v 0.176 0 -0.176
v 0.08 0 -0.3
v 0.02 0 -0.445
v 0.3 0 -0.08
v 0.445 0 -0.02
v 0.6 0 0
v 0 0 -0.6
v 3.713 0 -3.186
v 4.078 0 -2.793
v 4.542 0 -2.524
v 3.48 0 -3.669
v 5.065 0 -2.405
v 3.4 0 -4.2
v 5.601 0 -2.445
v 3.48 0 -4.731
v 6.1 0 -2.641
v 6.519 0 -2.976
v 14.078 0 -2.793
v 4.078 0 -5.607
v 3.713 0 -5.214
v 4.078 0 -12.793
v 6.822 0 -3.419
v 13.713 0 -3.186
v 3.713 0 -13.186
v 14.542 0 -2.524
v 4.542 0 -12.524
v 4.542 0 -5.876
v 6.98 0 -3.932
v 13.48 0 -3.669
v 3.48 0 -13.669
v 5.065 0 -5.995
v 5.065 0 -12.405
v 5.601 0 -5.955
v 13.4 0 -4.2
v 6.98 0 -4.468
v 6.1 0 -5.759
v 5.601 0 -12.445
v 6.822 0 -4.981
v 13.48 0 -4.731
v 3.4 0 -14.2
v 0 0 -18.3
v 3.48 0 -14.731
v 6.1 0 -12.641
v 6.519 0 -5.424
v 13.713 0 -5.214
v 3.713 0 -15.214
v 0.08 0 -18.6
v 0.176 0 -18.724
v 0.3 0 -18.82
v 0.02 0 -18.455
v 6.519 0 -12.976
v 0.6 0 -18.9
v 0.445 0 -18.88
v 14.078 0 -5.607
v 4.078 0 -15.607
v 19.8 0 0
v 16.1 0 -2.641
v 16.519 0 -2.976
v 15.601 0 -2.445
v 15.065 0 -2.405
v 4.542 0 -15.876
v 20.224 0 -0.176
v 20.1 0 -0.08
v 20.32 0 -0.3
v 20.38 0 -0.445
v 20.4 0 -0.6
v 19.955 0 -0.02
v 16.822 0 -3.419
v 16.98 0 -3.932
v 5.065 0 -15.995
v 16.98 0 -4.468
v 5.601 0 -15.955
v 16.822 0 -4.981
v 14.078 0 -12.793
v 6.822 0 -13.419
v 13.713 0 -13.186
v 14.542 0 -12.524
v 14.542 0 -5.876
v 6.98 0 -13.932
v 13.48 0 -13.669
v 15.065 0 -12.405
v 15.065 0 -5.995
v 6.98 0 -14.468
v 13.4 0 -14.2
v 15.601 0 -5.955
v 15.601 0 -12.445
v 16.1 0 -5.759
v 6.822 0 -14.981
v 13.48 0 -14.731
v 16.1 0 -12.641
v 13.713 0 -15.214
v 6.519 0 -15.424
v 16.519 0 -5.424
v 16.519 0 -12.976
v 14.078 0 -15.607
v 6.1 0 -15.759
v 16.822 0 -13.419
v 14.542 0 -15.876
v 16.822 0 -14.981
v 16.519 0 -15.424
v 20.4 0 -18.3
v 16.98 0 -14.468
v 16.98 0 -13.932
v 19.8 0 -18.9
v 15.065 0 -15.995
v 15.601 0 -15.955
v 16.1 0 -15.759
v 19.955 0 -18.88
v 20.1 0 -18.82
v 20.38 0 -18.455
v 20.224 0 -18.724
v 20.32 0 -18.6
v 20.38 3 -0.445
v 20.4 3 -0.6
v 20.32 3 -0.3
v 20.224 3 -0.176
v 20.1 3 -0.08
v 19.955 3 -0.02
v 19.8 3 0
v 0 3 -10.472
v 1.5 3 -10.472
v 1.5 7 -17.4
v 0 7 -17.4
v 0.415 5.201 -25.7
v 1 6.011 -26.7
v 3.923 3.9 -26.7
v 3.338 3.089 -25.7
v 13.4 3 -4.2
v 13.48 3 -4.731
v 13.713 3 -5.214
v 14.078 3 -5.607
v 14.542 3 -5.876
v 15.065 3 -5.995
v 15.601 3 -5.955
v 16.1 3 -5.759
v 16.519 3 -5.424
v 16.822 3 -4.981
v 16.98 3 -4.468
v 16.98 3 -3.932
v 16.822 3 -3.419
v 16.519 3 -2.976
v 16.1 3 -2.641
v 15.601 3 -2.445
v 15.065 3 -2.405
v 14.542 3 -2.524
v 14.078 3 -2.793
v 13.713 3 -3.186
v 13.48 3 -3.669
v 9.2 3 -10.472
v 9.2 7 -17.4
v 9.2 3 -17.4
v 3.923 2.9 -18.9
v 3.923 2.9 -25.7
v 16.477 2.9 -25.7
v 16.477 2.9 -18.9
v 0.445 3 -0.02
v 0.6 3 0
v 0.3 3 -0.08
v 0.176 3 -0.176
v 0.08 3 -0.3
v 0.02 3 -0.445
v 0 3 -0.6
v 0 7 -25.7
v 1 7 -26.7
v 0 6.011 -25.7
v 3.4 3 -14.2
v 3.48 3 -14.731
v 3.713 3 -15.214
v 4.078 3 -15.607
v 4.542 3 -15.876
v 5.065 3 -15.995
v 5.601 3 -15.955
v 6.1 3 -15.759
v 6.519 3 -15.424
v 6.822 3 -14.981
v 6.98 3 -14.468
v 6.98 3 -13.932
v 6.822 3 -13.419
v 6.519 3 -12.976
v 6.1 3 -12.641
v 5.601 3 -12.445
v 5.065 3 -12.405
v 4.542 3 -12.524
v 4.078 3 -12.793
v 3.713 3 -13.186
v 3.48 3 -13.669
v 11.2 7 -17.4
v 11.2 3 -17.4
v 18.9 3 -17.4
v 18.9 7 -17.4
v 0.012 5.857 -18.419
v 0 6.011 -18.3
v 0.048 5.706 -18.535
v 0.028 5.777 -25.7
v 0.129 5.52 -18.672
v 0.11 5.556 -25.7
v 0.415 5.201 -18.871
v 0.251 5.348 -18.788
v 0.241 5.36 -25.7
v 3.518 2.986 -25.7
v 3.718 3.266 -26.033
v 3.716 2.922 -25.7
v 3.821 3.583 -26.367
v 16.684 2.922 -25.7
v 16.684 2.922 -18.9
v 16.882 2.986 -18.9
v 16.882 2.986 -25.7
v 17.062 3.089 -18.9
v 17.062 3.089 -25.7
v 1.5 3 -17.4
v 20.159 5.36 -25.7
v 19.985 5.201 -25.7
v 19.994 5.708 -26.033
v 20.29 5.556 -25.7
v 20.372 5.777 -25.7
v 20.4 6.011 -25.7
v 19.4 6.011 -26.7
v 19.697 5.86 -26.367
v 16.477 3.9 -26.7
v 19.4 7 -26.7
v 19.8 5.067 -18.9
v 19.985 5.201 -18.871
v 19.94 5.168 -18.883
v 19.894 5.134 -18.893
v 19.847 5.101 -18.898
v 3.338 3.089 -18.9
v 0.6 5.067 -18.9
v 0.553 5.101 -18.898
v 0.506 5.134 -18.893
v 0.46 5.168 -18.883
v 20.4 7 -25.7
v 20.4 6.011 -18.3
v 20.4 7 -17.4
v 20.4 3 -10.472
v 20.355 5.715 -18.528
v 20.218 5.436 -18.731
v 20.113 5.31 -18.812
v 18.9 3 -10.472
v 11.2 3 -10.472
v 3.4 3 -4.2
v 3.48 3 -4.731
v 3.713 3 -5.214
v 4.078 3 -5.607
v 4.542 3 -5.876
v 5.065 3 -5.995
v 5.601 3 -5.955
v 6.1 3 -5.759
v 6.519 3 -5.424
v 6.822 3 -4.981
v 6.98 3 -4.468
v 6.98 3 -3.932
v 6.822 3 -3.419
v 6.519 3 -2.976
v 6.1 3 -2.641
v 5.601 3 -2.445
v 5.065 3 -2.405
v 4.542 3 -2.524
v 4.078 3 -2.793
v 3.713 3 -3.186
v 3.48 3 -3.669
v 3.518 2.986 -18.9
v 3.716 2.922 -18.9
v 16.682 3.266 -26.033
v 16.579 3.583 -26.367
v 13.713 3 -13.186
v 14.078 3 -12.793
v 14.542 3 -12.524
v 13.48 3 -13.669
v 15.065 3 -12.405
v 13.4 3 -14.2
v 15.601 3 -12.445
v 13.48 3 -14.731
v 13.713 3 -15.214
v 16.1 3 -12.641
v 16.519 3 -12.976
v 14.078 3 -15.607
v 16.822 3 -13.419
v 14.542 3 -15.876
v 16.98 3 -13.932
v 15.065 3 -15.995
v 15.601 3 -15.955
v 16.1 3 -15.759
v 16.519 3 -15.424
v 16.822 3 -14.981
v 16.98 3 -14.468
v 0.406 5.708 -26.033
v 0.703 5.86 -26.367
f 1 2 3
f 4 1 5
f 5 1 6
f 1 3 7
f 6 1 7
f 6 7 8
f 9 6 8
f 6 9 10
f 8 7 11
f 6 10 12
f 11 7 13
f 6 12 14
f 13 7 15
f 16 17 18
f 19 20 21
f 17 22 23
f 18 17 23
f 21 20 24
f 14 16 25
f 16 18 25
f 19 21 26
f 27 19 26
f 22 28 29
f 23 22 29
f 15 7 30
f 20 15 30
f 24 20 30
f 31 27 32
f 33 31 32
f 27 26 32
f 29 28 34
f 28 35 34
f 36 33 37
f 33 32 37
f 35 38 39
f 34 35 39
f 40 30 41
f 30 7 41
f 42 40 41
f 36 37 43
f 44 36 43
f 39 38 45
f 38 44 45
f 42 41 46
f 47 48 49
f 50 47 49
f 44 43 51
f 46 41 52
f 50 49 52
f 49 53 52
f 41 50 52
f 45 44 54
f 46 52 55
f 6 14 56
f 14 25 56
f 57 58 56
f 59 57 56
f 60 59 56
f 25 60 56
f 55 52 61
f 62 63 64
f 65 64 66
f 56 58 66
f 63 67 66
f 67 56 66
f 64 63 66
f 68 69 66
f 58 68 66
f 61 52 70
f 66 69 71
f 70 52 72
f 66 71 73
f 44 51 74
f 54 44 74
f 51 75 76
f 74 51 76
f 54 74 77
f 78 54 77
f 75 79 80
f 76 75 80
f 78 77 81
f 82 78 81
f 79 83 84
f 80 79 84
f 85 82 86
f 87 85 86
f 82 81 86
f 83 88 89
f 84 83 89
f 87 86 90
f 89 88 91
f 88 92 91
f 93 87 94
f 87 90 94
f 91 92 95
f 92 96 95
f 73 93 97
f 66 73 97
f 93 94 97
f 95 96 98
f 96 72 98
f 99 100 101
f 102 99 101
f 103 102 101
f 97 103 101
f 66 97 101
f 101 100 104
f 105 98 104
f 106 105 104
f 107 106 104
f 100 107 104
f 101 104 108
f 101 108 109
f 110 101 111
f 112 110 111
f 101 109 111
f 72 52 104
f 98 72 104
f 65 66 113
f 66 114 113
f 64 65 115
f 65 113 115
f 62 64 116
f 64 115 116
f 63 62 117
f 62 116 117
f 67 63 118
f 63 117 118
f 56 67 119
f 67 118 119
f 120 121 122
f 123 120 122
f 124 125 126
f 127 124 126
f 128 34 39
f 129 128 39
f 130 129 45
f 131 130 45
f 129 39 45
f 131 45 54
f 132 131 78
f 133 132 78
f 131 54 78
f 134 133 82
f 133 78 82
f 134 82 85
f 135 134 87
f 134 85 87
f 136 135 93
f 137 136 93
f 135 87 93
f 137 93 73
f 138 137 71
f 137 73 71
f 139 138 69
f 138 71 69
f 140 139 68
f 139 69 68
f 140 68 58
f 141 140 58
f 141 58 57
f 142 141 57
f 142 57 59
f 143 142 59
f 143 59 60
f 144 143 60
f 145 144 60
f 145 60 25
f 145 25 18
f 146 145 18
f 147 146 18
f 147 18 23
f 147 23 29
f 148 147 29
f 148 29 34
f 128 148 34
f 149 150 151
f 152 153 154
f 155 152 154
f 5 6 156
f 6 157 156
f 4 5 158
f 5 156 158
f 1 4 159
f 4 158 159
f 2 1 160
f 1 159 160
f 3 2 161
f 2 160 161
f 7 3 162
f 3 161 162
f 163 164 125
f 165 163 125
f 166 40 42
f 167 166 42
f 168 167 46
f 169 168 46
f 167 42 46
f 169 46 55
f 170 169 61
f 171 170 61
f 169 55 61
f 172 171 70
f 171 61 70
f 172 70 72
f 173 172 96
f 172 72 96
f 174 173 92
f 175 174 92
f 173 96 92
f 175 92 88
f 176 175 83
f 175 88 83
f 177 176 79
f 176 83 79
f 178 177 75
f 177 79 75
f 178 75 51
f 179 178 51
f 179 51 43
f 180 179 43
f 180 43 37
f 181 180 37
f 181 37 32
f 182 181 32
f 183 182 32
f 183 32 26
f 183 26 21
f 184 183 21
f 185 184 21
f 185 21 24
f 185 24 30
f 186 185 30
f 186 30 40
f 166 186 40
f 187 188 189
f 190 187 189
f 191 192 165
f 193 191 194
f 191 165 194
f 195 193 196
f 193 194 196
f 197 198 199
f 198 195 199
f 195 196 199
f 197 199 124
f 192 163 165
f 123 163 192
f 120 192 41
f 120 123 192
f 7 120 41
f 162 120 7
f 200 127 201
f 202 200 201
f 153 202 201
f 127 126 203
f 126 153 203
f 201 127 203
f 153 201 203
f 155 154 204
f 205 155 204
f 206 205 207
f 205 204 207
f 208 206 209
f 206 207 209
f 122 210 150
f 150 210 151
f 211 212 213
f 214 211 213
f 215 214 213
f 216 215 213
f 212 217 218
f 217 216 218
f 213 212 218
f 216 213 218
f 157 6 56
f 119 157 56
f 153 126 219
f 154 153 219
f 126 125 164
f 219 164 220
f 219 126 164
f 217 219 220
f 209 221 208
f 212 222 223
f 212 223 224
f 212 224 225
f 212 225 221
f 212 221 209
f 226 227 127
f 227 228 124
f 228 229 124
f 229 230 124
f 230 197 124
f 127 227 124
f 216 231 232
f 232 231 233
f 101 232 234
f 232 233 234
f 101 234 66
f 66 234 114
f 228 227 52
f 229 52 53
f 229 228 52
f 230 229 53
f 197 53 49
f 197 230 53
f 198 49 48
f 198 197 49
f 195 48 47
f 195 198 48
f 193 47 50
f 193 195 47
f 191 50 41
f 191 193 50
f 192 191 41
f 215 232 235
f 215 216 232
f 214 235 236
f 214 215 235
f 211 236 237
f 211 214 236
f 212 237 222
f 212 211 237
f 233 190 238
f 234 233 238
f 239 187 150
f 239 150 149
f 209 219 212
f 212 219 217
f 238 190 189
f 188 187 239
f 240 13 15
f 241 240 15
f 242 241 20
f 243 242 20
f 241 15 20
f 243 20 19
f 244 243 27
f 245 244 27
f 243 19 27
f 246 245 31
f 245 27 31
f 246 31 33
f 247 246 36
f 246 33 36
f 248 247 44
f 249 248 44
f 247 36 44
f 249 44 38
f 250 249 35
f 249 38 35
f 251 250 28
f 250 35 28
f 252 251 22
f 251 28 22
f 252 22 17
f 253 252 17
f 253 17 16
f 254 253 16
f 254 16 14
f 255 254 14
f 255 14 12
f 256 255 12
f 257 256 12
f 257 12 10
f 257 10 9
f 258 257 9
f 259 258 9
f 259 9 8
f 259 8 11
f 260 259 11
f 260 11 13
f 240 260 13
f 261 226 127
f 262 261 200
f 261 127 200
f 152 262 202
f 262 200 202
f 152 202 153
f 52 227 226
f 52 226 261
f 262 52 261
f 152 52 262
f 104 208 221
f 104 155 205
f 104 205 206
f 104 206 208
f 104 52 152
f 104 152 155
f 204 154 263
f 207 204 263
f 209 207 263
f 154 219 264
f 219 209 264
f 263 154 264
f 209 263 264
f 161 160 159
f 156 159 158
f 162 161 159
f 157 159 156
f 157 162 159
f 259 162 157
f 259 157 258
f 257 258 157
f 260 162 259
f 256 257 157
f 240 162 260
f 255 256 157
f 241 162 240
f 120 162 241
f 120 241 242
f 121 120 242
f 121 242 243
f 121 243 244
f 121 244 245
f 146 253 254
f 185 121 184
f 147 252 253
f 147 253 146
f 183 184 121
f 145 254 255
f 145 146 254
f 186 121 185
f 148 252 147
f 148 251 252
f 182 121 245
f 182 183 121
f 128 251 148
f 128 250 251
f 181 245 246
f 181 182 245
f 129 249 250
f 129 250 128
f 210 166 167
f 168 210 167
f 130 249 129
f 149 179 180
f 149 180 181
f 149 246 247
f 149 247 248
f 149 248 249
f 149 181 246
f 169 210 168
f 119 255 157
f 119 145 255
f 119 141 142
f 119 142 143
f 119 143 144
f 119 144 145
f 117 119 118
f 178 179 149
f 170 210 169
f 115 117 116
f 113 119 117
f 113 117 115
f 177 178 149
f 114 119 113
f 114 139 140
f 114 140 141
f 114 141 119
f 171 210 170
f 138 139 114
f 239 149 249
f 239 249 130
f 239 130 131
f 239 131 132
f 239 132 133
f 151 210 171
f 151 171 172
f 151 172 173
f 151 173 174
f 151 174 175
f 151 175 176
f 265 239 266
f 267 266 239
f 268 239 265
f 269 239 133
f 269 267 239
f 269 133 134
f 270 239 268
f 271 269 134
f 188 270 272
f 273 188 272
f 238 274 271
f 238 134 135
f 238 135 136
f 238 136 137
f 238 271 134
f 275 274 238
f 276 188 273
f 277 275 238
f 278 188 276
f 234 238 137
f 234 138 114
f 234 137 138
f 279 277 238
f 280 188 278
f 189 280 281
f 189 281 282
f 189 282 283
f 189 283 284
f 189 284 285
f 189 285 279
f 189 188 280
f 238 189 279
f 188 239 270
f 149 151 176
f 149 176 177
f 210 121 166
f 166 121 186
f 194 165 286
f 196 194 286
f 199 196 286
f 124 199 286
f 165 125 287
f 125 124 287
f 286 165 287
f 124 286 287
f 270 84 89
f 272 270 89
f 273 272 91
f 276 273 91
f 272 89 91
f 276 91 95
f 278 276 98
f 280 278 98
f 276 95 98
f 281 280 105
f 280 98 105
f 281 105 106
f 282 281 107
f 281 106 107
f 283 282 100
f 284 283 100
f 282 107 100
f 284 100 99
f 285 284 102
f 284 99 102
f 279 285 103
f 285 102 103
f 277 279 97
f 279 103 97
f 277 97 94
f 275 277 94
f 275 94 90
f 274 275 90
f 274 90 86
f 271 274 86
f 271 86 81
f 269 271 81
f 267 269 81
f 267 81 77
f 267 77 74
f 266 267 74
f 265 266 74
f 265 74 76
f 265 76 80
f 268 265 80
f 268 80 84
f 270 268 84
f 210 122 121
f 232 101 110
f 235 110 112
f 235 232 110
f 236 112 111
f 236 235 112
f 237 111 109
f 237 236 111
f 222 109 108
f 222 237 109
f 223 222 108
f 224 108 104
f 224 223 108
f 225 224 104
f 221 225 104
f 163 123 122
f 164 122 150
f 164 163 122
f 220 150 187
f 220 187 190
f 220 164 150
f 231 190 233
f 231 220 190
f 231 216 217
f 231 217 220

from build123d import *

# Parameters (mm, degrees)
SKETCH1_W                = 20.4
SKETCH1_H                = 18.9
BOSS_EXTRUDE1_DEPTH      = 3
M3_CLEARANCE_HOLE1_D     = 3.6
SKETCH4_W                = 20.4
SKETCH4_H                = 2.4
BOSS_EXTRUDE2_DEPTH      = 1.5
BOSS_EXTRUDE3_DEPTH      = 4
BOSS_EXTRUDE3_DEPTH_BACK = 0.1
SKETCH5_W                = 20.4
SKETCH5_H                = 9.3
CHAMFER1_SIZE            = 3.6
CHAMFER1_SIZE2           = 2.6
FILLET2_R                = 1
CHAMFER3_SIZE            = 1
FILLET1_R                = 0.6
RIB1_REACH               = 31.427
SKETCH7_WALL_W           = 68.853377202
SKETCH7_WALL_H           = 2
RIB2_START               = -1.5
RIB2_DEPTH               = 1.5
RIB10_REACH              = 36.323
SKETCH9_WALL_W           = 78.645466102
SKETCH9_WALL_H           = 1.5


# Read off the part's stored shape, not the designer's step: Rib2
with BuildPart() as part:
    # Sketch1 → Boss-Extrude1 (new body)
    with BuildSketch(Plane(origin=(0, 0, 0), x_dir=(1, 0, 0), z_dir=(0, 1, 0))):
        with Locations((10.2, 9.45)):
            Rectangle(SKETCH1_W, SKETCH1_H)
    extrude(amount=BOSS_EXTRUDE1_DEPTH)

    # M3 Clearance Hole1 (through all)
    with Locations(Plane(origin=(0, 3, 0), x_dir=(1, 0, 0), z_dir=(0, 1, 0))):
        with Locations((5.2, 4.2), (5.2, 14.2), (15.2, 14.2), (15.2, 4.2)):
            Hole(M3_CLEARANCE_HOLE1_D / 2)

    # Sketch4 → Boss-Extrude2 (add)
    with BuildSketch(Plane(origin=(0, 0, -18.9), x_dir=(-1, 0, 0), z_dir=(0, 0, -1))):
        with Locations((-10.2, 1.2)):
            Rectangle(SKETCH4_W, SKETCH4_H)
    extrude(amount=-BOSS_EXTRUDE2_DEPTH)

    # Sketch5 → Boss-Extrude3 (add, two sides: drawn at the far end of the back side and taken through both)
    with BuildSketch(Plane(origin=(0, 3, 0), x_dir=(1, 0, 0), z_dir=(0, 1, 0)).offset(-BOSS_EXTRUDE3_DEPTH_BACK)):
        with Locations((10.2, 22.05)):
            Rectangle(SKETCH5_W, SKETCH5_H)
    extrude(amount=BOSS_EXTRUDE3_DEPTH + BOSS_EXTRUDE3_DEPTH_BACK)

    # Chamfer1
    chamfer1_edges = [part.edges().sort_by_distance(p)[0] for p in [
        (20.4, 2.9, -22.8),
        (0, 2.9, -22.8),
    ]]
    chamfer1_side = [part.faces().sort_by_distance(p)[0] for p in [
        (10.2, 2.9, -22.8),
    ]]
    chamfer(chamfer1_edges, length=CHAMFER1_SIZE, length2=CHAMFER1_SIZE2, reference=chamfer1_side[0])

    # Fillet2
    fillet2_edges = [part.edges().sort_by_distance(p)[0] for p in [
        (20.4, 5.5, -22.8),
        (3.6, 2.9, -22.8),
        (16.8, 2.9, -22.8),
        (0, 5.5, -22.8),
    ]]
    fillet(fillet2_edges, radius=FILLET2_R)

    # Chamfer3
    chamfer3_edges = [part.edges().sort_by_distance(p)[0] for p in [
        (16.784315179, 2.94850664, -26.7),
        (20.290362441, 5.556058922, -26.7),
        (20.4, 6.505655648, -26.7),
        (18.523813503, 4.144976419, -26.7),
        (10.2, 2.9, -26.7),
        (1.876186497, 4.144976419, -26.7),
        (0, 6.505655648, -26.7),
        (0.109637559, 5.556058922, -26.7),
        (3.615684821, 2.94850664, -26.7),
    ]]
    chamfer(chamfer3_edges, length=CHAMFER3_SIZE - 0.0001)  # a hair under: the kernel refuses the full size

    # Fillet1
    fillet1_edges = [part.edges().sort_by_distance(p)[0] for p in [
        (0, 1.5, 0),
        (20.4, 1.5, 0),
        (20.4, 3.005655648, -18.9),
        (0, 3.005655648, -18.9),
    ]]
    fillet(fillet1_edges, radius=FILLET1_R)

    # Sketch7 wall → Rib1 (add, up to next)
    with BuildSketch(Plane(origin=(10.2, 5, -13.935898385), x_dir=(0, -0.500000000015, 0.866025403776), z_dir=(0, 0.866025403776, 0.500000000015)), mode=Mode.PRIVATE) as rib1_sk1:
        Rectangle(SKETCH7_WALL_W, SKETCH7_WALL_H)
    rib1_tool1 = extrude(rib1_sk1.sketch, amount=-RIB1_REACH, mode=Mode.PRIVATE) - part.part
    add(rib1_tool1.solids().sort_by_distance((10.2, 5, -13.935898385))[0])

    # Rib2 outline → Rib2 (add)
    with BuildSketch(Plane.ZY.offset(RIB2_START)):
        Polygon((-10.47179677, 3), (-17.4, 7), (-17.4, 3), align=None)
    extrude(amount=RIB2_DEPTH)

    # Sketch9 wall → Rib10 (add, up to next)
    with BuildSketch(Plane(origin=(20.4, 5, -13.935898385), x_dir=(0, -0.500000000015, 0.866025403776), z_dir=(0, -0.866025403776, -0.500000000015)), mode=Mode.PRIVATE) as rib10_sk1:
        with Locations((0, 0.75)):
            Rectangle(SKETCH9_WALL_W, SKETCH9_WALL_H)
    rib10_tool1 = extrude(rib10_sk1.sketch, amount=RIB10_REACH, mode=Mode.PRIVATE) - part.part
    add(rib10_tool1.solids().sort_by_distance((20.4, 5, -13.935898385))[0])


solid = part.part
